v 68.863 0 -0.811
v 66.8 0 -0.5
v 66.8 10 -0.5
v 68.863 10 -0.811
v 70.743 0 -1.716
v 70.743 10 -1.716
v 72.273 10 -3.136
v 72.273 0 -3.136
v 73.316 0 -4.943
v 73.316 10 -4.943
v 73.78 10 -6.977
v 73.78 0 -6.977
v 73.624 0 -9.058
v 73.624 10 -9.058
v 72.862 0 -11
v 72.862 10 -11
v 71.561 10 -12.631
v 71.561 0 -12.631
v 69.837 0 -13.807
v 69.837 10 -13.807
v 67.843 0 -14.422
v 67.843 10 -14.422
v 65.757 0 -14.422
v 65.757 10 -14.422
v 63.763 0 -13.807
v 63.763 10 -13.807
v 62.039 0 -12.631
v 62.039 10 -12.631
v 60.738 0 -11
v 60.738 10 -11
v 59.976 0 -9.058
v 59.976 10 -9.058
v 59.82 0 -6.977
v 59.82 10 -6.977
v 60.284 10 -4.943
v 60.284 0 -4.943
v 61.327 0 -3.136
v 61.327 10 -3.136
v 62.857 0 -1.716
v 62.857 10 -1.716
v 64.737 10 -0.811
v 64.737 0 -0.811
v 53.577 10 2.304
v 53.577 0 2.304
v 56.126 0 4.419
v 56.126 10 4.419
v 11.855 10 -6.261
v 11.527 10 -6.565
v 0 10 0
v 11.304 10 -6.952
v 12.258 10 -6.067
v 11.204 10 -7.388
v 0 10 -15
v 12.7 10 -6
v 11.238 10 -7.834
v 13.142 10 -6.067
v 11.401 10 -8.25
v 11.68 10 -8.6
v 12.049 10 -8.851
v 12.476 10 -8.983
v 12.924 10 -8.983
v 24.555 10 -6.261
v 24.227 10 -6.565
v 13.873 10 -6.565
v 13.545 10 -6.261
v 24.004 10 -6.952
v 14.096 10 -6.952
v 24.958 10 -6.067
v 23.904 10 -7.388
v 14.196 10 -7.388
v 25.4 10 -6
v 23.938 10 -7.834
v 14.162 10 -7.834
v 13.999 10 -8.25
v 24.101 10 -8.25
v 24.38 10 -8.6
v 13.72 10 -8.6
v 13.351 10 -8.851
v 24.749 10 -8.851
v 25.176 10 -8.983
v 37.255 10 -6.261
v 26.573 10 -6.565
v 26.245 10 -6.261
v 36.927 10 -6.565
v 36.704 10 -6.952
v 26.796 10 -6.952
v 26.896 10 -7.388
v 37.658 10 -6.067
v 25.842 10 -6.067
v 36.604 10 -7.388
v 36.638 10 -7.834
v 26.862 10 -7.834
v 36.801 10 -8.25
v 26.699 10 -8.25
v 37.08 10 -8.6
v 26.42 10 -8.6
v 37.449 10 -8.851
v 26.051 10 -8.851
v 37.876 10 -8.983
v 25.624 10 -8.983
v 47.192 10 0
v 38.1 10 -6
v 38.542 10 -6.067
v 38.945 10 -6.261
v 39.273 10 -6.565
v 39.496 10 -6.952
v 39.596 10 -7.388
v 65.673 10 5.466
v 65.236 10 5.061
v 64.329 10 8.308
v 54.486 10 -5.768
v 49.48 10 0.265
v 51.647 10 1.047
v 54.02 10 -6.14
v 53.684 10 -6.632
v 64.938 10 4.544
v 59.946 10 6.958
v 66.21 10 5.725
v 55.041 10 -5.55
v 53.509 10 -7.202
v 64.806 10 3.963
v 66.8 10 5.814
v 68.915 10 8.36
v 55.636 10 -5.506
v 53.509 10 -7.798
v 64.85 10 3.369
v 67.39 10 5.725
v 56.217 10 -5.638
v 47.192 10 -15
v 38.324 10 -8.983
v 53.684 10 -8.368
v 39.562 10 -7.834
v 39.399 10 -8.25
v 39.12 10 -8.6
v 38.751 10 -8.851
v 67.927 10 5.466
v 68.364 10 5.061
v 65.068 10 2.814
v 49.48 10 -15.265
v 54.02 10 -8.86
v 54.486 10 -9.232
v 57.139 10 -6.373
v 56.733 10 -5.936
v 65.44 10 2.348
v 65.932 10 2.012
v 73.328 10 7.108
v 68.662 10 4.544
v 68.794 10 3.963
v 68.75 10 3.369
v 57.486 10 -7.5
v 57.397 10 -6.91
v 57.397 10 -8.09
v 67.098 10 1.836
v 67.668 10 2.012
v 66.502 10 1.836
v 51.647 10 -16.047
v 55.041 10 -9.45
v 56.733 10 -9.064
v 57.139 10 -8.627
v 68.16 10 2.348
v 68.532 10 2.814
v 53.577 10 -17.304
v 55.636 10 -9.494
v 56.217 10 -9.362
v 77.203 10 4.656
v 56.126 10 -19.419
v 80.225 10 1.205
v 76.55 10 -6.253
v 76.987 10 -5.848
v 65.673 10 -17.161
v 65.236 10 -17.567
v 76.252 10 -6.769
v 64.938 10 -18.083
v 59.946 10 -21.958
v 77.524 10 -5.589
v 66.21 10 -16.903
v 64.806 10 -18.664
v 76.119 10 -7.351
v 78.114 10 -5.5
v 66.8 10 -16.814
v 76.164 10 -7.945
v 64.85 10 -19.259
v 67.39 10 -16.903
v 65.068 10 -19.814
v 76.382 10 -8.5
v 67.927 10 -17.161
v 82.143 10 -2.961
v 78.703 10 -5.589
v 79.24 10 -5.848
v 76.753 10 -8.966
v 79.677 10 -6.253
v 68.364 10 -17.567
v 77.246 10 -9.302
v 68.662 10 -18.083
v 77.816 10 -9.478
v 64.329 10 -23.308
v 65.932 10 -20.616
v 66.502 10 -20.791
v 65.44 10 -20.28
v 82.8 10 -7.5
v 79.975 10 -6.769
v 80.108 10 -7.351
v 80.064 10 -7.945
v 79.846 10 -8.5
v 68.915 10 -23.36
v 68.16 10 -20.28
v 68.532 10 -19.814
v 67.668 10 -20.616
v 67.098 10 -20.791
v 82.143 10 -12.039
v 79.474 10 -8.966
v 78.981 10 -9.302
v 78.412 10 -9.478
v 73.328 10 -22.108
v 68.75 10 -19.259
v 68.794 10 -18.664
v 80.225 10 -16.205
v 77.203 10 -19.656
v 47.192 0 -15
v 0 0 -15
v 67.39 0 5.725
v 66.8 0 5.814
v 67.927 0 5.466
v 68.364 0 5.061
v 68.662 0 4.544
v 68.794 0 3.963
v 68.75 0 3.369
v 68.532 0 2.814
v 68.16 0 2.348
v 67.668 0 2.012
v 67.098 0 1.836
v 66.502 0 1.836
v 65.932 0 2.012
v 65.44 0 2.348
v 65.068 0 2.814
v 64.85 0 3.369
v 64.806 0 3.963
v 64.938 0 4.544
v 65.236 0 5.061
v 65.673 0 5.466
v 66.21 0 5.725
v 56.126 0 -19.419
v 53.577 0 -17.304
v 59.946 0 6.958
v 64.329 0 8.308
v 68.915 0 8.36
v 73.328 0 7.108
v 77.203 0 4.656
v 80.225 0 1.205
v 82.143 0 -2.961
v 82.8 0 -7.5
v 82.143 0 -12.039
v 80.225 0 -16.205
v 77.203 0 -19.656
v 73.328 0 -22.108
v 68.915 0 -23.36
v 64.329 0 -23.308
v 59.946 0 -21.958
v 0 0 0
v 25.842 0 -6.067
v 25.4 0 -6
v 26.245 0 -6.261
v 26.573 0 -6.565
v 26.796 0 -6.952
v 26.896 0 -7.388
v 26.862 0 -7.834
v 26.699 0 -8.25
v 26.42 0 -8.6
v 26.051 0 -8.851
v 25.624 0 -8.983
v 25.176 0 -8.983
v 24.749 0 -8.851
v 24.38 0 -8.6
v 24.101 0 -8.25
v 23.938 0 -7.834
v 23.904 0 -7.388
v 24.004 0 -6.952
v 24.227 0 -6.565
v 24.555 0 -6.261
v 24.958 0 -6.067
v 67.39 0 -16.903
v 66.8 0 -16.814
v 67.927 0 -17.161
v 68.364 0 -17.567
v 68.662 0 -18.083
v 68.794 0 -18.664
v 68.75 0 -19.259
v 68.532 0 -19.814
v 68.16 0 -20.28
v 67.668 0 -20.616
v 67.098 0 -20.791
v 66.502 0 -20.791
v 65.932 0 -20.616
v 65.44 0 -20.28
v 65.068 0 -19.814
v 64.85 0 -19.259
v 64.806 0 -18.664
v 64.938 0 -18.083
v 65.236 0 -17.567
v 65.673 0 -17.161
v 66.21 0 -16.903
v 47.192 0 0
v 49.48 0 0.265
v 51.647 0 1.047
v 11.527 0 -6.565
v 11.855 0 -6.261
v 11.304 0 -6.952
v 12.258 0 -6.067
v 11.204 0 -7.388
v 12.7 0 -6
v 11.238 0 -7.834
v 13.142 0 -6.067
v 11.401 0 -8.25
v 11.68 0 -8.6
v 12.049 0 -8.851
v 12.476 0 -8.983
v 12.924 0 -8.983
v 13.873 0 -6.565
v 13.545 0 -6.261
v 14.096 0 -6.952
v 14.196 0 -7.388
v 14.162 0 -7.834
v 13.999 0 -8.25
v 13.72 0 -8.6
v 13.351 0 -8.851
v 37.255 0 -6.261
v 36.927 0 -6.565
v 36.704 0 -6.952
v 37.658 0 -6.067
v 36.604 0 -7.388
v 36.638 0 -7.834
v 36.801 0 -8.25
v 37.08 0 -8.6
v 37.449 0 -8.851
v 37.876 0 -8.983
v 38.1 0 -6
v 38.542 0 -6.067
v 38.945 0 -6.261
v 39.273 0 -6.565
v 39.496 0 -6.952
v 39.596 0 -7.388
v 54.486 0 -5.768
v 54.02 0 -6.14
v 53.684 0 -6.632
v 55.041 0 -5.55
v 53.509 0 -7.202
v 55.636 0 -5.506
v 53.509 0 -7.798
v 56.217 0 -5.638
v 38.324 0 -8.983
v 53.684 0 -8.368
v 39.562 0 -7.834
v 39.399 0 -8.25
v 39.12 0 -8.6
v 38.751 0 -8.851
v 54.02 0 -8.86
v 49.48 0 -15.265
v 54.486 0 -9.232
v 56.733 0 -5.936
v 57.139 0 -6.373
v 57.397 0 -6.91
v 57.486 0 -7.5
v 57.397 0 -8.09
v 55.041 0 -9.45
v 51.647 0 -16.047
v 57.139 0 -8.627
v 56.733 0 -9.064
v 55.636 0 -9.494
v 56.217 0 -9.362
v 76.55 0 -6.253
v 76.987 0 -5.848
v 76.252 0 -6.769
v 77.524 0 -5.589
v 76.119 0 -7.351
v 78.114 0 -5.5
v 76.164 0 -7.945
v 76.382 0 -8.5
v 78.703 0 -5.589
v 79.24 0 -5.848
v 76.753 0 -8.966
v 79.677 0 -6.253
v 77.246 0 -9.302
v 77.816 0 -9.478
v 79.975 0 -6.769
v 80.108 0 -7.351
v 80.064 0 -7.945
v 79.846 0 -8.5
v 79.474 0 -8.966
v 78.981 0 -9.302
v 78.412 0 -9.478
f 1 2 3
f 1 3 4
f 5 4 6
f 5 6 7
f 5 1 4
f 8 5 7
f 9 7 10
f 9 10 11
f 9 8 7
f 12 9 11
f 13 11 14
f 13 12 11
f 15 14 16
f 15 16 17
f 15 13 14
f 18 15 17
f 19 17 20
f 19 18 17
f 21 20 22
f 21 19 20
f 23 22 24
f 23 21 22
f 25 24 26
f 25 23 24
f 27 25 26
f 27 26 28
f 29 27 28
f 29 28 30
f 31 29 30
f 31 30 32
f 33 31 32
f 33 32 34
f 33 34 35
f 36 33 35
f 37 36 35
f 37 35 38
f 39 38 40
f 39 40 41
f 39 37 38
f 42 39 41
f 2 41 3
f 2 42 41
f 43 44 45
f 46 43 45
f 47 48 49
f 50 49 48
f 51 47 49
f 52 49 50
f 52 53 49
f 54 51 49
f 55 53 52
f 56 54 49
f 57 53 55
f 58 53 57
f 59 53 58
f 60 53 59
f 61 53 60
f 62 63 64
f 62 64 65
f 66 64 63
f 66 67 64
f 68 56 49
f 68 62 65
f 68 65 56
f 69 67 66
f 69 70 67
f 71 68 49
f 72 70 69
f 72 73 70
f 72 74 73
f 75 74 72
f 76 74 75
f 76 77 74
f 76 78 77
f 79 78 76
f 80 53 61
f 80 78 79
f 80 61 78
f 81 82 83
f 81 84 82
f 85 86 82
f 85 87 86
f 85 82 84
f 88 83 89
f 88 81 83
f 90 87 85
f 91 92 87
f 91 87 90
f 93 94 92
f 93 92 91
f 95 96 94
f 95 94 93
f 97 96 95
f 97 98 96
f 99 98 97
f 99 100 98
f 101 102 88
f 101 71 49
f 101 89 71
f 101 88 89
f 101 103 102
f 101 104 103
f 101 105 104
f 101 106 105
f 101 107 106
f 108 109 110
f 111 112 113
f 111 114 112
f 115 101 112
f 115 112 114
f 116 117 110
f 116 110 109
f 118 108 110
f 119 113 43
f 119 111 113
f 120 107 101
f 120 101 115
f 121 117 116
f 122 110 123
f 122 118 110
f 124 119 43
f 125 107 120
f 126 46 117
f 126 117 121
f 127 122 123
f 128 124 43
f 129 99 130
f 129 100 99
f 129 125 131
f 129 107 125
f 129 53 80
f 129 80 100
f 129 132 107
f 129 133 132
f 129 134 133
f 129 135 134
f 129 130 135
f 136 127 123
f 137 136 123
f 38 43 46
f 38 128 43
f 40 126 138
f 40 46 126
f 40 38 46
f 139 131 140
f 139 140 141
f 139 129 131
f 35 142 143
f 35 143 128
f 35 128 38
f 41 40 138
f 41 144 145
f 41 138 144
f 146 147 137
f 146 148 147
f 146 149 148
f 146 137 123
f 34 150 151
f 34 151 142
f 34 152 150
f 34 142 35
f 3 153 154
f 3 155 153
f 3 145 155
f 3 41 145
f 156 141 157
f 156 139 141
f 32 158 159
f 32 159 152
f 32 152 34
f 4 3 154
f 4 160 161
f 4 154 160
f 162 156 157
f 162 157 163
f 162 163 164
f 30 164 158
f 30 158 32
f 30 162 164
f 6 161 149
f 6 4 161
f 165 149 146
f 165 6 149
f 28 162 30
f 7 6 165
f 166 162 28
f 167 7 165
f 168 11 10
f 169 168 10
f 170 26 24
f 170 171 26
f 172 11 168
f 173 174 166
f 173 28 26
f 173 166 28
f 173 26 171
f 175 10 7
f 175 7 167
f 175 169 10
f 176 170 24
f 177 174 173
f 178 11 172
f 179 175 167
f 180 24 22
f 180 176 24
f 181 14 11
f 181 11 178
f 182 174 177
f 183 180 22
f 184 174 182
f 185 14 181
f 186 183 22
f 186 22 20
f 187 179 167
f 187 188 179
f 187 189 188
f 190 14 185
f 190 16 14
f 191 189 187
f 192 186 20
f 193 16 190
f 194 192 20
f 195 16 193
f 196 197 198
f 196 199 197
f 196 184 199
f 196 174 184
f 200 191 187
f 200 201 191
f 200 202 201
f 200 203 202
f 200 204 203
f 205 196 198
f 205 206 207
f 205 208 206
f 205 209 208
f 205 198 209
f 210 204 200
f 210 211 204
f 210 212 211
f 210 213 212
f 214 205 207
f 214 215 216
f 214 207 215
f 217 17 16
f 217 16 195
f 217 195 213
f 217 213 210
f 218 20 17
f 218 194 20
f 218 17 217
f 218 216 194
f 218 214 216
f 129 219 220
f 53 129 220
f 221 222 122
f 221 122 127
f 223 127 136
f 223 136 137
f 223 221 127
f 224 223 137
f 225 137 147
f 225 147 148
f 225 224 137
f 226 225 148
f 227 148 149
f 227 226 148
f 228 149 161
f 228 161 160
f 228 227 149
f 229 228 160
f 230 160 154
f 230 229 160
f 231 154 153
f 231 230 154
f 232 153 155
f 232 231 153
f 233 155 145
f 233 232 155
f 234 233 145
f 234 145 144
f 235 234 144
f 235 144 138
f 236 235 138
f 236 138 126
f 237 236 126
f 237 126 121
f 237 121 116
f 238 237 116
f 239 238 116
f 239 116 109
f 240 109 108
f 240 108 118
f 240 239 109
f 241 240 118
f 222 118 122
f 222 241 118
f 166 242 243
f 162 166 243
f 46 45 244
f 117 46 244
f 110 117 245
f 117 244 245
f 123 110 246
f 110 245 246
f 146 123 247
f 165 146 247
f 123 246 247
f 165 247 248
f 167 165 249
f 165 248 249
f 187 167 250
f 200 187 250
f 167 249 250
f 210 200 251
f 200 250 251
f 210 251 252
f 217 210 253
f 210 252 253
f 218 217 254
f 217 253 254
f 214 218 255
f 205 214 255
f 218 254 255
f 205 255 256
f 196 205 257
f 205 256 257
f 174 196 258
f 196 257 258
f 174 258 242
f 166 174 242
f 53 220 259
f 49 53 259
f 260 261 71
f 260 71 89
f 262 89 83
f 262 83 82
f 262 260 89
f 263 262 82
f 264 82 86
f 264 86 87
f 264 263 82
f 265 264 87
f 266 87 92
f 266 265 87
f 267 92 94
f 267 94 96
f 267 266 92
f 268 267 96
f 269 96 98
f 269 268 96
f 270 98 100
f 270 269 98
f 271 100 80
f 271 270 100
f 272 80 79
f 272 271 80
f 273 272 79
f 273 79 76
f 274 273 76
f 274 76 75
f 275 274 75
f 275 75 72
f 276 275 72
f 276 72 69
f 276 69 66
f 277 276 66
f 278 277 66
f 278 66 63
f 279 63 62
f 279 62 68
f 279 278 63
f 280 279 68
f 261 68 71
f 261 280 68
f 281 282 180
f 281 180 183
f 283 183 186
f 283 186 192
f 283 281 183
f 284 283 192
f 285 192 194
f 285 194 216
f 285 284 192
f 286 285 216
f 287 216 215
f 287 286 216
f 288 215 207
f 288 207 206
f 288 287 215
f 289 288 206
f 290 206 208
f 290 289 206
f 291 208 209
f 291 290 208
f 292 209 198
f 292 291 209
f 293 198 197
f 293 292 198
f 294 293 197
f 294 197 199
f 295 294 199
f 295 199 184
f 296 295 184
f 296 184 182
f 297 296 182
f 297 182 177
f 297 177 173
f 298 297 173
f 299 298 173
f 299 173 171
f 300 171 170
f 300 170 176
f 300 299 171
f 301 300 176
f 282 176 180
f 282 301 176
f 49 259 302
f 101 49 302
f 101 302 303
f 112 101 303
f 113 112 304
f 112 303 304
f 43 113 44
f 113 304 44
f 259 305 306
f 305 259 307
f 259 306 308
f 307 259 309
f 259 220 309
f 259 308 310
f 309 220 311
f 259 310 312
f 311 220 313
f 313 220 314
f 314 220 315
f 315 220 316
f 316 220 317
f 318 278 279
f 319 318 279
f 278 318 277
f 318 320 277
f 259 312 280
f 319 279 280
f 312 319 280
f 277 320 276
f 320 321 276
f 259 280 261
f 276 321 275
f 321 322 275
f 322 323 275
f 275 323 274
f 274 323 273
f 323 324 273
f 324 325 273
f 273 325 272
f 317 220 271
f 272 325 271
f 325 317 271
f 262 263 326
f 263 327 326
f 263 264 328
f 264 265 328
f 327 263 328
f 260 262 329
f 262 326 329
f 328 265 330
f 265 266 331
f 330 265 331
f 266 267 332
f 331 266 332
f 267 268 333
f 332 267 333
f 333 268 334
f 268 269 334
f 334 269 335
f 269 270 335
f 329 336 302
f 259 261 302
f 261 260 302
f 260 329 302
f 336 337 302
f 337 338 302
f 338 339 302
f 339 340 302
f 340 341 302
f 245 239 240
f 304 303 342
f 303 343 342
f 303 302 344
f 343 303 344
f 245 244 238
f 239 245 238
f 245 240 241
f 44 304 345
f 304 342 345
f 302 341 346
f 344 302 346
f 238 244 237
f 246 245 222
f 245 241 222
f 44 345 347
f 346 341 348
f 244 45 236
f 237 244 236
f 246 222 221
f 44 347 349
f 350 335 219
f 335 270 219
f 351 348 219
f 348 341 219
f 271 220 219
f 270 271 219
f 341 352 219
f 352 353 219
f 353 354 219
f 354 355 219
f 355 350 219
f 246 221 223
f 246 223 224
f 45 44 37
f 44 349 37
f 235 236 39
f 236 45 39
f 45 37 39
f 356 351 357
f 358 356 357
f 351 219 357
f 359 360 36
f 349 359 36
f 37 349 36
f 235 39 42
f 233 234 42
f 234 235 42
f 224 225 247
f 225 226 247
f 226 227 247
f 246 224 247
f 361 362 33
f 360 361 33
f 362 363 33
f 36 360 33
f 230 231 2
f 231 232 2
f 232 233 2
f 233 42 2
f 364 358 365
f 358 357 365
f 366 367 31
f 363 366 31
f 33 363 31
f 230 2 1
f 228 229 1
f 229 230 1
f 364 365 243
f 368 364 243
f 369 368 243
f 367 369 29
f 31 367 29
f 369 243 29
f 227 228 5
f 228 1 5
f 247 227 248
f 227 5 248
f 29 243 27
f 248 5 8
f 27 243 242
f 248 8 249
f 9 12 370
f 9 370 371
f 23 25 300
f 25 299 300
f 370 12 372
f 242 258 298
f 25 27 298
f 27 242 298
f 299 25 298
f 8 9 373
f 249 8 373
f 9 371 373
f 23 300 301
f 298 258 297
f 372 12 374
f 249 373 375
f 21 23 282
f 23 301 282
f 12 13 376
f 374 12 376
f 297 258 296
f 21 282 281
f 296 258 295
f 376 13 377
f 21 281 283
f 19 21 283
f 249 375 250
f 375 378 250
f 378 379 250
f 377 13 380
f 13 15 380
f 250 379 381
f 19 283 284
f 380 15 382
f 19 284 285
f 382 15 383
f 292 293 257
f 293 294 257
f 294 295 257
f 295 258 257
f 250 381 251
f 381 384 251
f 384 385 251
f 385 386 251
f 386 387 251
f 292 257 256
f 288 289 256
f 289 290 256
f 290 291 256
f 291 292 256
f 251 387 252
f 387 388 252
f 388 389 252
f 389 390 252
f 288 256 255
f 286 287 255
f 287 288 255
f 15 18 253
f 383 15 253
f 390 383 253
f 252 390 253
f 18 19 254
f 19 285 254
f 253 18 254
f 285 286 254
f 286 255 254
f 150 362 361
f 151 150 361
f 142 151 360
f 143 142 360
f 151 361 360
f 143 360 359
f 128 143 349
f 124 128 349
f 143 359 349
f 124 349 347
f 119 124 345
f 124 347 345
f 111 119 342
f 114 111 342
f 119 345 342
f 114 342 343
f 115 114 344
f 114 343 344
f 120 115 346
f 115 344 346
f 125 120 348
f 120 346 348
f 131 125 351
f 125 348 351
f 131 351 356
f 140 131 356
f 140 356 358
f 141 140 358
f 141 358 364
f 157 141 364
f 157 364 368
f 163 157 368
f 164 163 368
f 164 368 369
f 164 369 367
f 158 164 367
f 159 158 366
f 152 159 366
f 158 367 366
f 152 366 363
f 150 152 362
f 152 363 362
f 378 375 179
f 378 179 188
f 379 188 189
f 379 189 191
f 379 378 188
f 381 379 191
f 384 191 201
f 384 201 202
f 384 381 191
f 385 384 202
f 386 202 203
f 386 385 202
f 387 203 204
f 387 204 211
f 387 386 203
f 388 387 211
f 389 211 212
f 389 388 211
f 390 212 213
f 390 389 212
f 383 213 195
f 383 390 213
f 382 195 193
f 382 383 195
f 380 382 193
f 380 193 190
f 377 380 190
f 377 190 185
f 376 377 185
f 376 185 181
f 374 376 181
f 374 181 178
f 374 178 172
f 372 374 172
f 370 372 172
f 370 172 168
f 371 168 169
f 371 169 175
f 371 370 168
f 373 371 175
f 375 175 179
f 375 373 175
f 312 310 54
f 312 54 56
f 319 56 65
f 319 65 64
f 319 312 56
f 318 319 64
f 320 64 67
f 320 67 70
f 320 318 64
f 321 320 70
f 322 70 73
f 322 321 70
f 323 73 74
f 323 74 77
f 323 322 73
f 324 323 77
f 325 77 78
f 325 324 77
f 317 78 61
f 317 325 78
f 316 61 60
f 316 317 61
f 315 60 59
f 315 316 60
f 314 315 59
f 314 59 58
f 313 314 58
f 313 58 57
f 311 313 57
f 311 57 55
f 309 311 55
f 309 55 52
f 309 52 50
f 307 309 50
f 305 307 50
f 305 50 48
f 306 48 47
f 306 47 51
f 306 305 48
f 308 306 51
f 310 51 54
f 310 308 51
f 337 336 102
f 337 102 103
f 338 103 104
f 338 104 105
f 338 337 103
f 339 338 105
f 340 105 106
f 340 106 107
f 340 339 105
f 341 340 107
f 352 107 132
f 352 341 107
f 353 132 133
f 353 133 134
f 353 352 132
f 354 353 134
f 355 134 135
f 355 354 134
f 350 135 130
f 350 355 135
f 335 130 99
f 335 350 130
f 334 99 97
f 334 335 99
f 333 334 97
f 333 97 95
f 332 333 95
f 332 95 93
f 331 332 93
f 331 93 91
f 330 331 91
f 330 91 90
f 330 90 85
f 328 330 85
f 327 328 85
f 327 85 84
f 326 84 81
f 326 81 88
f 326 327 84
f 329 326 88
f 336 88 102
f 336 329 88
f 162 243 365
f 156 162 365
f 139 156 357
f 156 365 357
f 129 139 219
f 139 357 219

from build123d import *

# Parameters (mm, degrees)
SKETCH1_R           = 1.5
SKETCH1_R_2         = 2
SKETCH1_R_3         = 7
BOSS_EXTRUDE1_DEPTH = 10


with BuildPart() as part:
    # Sketch1 → Boss-Extrude1 (new body)
    with BuildSketch(Plane(origin=(0, 0, 0), x_dir=(1, 0, 0), z_dir=(0, 1, 0))):
        with BuildLine():
            ThreePointArc((53.57700678, 17.304163694), (50.585779575, 15.593662693), (47.191546456, 15))
            Line((47.191546456, 15), (0, 15))
            Line((0, 15), (0, 0))
            Line((0, 0), (47.191546456, 0))
            ThreePointArc((47.191546456, 0), (50.585779575, -0.593662693), (53.57700678, -2.304163694))
            Line((53.57700678, -2.304163694), (56.126078821, -4.419203273))
            ThreePointArc((56.126078821, -4.419203273), (82.8, 7.5), (56.126078821, 19.419203273))
            Line((56.126078821, 19.419203273), (53.57700678, 17.304163694))
        make_face()
        with Locations(Location((12.7, 7.5, 0), (0, 0, 270))):
            Circle(SKETCH1_R, mode=Mode.SUBTRACT)
        with Locations(Location((25.4, 7.5, 0), (0, 0, 270))):
            Circle(SKETCH1_R, mode=Mode.SUBTRACT)
        with Locations(Location((38.1, 7.5, 0), (0, 0, 270))):
            Circle(SKETCH1_R, mode=Mode.SUBTRACT)
        with BuildLine():
            ThreePointArc((53.4862915, 7.5), (55.4862915, 9.5), (57.4862915, 7.5))
            ThreePointArc((57.4862915, 7.5), (55.4862915, 5.5), (53.4862915, 7.5))
        make_face(mode=Mode.SUBTRACT)
        with Locations(Location((66.8, -3.8137085, 0), (0, 0, 270))):
            Circle(SKETCH1_R_2, mode=Mode.SUBTRACT)
        with Locations(Location((66.8, 18.8137085, 0), (0, 0, 270))):
            Circle(SKETCH1_R_2, mode=Mode.SUBTRACT)
        with Locations(Location((78.1137085, 7.5, 0), (0, 0, 270))):
            Circle(SKETCH1_R_2, mode=Mode.SUBTRACT)
        with Locations(Location((66.8, 7.5, 0), (0, 0, 270))):
            Circle(SKETCH1_R_3, mode=Mode.SUBTRACT)
    extrude(amount=BOSS_EXTRUDE1_DEPTH)


solid = part.part
